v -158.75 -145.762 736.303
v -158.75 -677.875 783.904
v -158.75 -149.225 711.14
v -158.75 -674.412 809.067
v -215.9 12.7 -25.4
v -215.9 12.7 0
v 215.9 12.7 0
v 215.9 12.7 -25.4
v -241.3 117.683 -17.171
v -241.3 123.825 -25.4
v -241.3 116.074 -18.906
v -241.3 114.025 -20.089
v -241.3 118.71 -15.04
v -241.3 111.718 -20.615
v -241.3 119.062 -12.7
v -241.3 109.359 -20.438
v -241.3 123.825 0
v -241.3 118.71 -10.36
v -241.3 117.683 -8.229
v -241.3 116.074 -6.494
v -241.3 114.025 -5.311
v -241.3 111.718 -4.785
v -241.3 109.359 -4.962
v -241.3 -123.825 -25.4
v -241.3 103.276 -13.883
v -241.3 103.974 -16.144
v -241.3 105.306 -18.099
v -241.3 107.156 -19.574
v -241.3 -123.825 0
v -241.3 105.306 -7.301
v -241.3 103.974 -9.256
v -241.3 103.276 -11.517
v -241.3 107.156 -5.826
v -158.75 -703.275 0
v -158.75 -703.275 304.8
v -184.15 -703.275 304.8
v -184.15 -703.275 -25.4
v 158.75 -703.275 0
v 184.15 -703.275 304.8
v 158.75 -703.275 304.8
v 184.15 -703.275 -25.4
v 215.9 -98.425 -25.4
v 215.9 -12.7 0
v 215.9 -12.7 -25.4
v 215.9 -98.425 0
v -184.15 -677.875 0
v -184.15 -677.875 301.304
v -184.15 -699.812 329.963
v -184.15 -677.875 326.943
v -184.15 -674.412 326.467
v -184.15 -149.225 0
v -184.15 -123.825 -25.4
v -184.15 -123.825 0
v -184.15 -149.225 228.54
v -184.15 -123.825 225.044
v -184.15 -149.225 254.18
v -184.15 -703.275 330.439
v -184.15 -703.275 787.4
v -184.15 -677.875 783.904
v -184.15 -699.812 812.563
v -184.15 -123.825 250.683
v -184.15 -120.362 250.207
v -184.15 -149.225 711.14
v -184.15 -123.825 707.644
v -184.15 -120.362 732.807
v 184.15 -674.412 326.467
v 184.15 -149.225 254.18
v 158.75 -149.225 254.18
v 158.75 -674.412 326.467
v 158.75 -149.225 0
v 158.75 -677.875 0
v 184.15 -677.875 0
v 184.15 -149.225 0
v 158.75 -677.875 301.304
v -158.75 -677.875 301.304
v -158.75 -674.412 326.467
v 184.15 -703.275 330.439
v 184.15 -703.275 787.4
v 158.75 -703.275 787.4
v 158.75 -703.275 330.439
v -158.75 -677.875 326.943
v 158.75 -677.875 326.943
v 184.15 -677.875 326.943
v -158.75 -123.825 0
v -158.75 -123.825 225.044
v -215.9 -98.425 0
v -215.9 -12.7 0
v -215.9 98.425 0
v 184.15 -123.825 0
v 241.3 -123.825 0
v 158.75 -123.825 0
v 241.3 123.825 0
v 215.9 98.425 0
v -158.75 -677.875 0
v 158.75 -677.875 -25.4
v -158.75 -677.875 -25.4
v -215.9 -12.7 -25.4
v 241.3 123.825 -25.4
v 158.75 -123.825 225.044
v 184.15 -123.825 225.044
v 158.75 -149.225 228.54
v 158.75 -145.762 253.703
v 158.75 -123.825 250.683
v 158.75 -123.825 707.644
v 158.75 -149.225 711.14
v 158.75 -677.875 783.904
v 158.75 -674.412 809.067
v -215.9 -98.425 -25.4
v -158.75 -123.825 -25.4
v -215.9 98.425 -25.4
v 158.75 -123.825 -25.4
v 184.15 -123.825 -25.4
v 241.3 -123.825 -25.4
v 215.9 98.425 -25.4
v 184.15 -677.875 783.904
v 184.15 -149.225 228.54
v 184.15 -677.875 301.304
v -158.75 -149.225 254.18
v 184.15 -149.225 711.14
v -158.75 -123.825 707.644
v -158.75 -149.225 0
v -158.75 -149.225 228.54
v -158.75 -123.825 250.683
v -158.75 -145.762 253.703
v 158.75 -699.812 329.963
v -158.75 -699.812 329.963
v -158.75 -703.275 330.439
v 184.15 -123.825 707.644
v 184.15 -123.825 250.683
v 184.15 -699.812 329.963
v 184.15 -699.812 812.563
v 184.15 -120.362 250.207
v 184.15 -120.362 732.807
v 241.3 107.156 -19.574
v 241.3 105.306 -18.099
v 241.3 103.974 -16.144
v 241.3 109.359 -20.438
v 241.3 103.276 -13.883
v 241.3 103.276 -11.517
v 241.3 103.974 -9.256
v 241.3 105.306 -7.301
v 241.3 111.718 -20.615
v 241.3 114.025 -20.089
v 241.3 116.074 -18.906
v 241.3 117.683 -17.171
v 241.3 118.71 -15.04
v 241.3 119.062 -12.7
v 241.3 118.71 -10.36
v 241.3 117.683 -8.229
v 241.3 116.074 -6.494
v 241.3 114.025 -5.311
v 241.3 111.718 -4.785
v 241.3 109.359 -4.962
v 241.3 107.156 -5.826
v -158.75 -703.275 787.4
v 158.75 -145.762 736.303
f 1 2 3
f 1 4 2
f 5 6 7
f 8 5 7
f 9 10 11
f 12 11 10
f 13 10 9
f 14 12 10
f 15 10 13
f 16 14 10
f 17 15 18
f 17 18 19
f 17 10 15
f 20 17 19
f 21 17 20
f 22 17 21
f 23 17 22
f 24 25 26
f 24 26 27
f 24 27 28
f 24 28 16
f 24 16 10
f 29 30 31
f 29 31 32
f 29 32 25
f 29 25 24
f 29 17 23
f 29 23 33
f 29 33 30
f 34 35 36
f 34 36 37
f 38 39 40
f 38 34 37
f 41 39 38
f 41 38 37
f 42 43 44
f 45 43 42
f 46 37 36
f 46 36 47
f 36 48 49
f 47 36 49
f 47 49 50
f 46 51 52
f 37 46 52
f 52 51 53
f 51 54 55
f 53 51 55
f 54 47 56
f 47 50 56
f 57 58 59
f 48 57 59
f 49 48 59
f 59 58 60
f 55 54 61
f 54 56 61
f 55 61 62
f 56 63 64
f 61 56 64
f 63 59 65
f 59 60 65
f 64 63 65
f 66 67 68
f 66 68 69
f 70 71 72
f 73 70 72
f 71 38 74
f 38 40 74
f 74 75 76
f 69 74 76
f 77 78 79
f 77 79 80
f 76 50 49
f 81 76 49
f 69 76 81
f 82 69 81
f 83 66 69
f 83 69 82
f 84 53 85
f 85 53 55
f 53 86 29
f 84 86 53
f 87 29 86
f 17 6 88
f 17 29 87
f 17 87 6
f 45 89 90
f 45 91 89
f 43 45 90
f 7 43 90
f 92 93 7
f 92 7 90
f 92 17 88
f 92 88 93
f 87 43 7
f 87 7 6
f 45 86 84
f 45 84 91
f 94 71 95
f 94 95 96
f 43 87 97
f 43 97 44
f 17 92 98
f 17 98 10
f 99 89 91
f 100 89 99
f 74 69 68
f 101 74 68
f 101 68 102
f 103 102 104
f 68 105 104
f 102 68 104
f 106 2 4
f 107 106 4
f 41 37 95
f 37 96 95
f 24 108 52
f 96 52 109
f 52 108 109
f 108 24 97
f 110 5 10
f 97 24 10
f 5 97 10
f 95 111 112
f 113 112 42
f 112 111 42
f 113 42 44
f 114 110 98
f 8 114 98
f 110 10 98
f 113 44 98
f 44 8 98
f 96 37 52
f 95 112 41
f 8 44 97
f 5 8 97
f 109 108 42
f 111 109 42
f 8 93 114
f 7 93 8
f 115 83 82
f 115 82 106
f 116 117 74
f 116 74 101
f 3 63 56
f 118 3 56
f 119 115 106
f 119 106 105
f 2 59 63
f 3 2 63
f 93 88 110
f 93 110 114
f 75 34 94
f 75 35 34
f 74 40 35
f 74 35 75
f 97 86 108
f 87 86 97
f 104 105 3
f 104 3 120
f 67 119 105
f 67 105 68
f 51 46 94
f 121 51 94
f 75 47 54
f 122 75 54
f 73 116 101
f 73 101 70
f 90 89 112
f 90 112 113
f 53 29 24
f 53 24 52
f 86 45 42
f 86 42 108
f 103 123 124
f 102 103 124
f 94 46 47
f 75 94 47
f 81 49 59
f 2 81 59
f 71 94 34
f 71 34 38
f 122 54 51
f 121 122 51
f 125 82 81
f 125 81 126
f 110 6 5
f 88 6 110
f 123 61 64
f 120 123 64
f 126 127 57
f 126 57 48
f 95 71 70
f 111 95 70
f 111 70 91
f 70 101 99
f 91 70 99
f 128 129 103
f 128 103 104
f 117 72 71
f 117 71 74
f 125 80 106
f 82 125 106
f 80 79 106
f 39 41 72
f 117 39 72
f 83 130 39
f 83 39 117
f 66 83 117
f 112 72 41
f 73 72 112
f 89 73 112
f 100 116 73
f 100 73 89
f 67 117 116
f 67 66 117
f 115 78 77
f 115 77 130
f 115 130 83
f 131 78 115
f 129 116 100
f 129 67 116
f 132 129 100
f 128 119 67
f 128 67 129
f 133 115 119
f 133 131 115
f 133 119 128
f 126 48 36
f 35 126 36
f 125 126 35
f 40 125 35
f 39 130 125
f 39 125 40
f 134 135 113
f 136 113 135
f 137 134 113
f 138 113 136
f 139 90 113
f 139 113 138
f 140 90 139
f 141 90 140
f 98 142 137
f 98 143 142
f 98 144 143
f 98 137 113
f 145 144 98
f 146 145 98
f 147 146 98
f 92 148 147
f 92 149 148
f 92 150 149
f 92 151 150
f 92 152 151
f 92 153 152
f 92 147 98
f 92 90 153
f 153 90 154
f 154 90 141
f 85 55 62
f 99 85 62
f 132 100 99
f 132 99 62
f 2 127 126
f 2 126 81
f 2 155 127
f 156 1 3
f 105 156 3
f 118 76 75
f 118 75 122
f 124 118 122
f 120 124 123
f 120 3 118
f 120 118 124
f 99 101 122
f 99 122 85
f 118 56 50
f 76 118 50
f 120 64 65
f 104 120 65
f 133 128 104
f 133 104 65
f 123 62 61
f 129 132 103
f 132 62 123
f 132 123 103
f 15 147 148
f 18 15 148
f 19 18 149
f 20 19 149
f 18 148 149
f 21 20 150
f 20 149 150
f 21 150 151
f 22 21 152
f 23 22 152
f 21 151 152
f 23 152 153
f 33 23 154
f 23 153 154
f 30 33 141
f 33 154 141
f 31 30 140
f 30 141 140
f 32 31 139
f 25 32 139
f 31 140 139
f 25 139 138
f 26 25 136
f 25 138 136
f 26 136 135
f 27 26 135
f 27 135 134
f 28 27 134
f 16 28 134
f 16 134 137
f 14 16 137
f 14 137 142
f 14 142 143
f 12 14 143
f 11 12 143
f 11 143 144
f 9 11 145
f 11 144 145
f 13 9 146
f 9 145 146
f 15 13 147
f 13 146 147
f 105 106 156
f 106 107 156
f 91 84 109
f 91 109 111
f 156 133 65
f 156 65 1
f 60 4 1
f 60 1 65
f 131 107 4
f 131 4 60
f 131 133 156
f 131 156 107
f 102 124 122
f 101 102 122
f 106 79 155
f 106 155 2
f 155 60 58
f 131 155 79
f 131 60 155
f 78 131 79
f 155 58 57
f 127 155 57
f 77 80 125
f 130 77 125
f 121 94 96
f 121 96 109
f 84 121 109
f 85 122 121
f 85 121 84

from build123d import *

# Parameters (mm, degrees)
F0_W     = 431.8
F0_H     = 25.4
F1_DEPTH = 25.4
F3_DEPTH = 25.4
F5_DEPTH = 368.3
F6_R     = 7.9375
F7_DEPTH = 482.6


with BuildPart() as f1:
    # F0 (on Top) → F1 (new body)
    with BuildSketch(Plane.XY):
        Polygon((241.3, 123.825), (-241.3, 123.825), (-241.3, -123.825), (-184.15, -123.825), (-158.75, -123.825), (158.75, -123.825), (184.15, -123.825), (241.3, -123.825), align=None)
        Polygon((-215.9, 98.425), (215.9, 98.425), (215.9, 12.7), (215.9, -12.7), (215.9, -98.425), (-215.9, -98.425), (-215.9, -12.7), (-215.9, 12.7), align=None, mode=Mode.SUBTRACT)
        Polygon((-158.75, -123.825), (-184.15, -123.825), (-184.15, -703.2752), (184.15, -703.2752), (184.15, -123.825), (158.75, -123.825), (158.75, -677.8752), (-158.75, -677.8752), align=None)
        Rectangle(F0_W, F0_H)
    extrude(amount=-F1_DEPTH)

    # F4: F3 across plane


with BuildPart() as f3:
    # F2 (on face) → F3 (new body)
    with BuildSketch(Plane.YZ.offset(184.15)):
        Polygon((-699.8117743353, 329.9627638121), (-703.2752, 304.8), (-677.8752, 301.3039209309), (-674.4117743353, 326.466684743), (-677.8752, 326.9433937971), align=None)
        Polygon((-674.4117743353, 326.466684743), (-677.8752, 301.3039209309), (-149.225, 228.5400272659), (-145.7615743353, 253.702791078), (-149.225, 254.1795001321), align=None)
        Polygon((-703.2752, 330.4394728662), (-699.8117743353, 329.9627638121), (-677.8752, 326.9433937971), (-677.8752, 783.9039209309), (-703.2752, 787.4), align=None)
        Polygon((-145.7615743353, 253.702791078), (-149.225, 228.5400272659), (-123.825, 225.0439481968), (-120.3615743353, 250.2067120089), (-123.825, 250.683421063), align=None)
        Polygon((-149.225, 254.1795001321), (-145.7615743353, 253.702791078), (-123.825, 250.683421063), (-123.825, 707.6439481968), (-149.225, 711.1400272659), align=None)
        Polygon((-674.4117743353, 809.066684743), (-677.8752, 783.9039209309), (-149.225, 711.1400272659), (-145.7615743353, 736.302791078), align=None)
        Polygon((-703.2752, 787.4), (-677.8752, 783.9039209309), (-674.4117743353, 809.066684743), (-699.8117743353, 812.5627638121), align=None)
        Polygon((-145.7615743353, 736.302791078), (-149.225, 711.1400272659), (-123.825, 707.6439481968), (-120.3615743353, 732.8067120089), align=None)
        Polygon((-703.2752, 304.8), (-703.2752, 0), (-677.8752, 0), (-677.8752, 301.3039209309), align=None)
        Polygon((-149.225, 228.5400272659), (-149.225, 0), (-123.825, 0), (-123.825, 225.0439481968), align=None)
    extrude(amount=-F3_DEPTH)


with BuildPart() as f1_1:
    add(f1.part)
    add(f3.part.mirror(Plane.YZ))


    add(f3.part)  # F5 merges F3
    # F2 (on face) → F5 (join)
    with BuildSketch(Plane.YZ.offset(184.15)):
        Polygon((-699.8117743353, 329.9627638121), (-703.2752, 304.8), (-677.8752, 301.3039209309), (-674.4117743353, 326.466684743), (-677.8752, 326.9433937971), align=None)
        Polygon((-145.7615743353, 253.702791078), (-149.225, 228.5400272659), (-123.825, 225.0439481968), (-120.3615743353, 250.2067120089), (-123.825, 250.683421063), align=None)
        Polygon((-703.2752, 787.4), (-677.8752, 783.9039209309), (-674.4117743353, 809.066684743), (-699.8117743353, 812.5627638121), align=None)
        Polygon((-145.7615743353, 736.302791078), (-149.225, 711.1400272659), (-123.825, 707.6439481968), (-120.3615743353, 732.8067120089), align=None)
    extrude(amount=-F5_DEPTH)

    # F6 (on face) → F7 (cut)
    with BuildSketch(Plane.YZ.offset(241.3)):
        with Locations((111.125, -12.7)):
            Circle(F6_R)
    extrude(amount=-F7_DEPTH, mode=Mode.SUBTRACT)


solid = f1_1.part
